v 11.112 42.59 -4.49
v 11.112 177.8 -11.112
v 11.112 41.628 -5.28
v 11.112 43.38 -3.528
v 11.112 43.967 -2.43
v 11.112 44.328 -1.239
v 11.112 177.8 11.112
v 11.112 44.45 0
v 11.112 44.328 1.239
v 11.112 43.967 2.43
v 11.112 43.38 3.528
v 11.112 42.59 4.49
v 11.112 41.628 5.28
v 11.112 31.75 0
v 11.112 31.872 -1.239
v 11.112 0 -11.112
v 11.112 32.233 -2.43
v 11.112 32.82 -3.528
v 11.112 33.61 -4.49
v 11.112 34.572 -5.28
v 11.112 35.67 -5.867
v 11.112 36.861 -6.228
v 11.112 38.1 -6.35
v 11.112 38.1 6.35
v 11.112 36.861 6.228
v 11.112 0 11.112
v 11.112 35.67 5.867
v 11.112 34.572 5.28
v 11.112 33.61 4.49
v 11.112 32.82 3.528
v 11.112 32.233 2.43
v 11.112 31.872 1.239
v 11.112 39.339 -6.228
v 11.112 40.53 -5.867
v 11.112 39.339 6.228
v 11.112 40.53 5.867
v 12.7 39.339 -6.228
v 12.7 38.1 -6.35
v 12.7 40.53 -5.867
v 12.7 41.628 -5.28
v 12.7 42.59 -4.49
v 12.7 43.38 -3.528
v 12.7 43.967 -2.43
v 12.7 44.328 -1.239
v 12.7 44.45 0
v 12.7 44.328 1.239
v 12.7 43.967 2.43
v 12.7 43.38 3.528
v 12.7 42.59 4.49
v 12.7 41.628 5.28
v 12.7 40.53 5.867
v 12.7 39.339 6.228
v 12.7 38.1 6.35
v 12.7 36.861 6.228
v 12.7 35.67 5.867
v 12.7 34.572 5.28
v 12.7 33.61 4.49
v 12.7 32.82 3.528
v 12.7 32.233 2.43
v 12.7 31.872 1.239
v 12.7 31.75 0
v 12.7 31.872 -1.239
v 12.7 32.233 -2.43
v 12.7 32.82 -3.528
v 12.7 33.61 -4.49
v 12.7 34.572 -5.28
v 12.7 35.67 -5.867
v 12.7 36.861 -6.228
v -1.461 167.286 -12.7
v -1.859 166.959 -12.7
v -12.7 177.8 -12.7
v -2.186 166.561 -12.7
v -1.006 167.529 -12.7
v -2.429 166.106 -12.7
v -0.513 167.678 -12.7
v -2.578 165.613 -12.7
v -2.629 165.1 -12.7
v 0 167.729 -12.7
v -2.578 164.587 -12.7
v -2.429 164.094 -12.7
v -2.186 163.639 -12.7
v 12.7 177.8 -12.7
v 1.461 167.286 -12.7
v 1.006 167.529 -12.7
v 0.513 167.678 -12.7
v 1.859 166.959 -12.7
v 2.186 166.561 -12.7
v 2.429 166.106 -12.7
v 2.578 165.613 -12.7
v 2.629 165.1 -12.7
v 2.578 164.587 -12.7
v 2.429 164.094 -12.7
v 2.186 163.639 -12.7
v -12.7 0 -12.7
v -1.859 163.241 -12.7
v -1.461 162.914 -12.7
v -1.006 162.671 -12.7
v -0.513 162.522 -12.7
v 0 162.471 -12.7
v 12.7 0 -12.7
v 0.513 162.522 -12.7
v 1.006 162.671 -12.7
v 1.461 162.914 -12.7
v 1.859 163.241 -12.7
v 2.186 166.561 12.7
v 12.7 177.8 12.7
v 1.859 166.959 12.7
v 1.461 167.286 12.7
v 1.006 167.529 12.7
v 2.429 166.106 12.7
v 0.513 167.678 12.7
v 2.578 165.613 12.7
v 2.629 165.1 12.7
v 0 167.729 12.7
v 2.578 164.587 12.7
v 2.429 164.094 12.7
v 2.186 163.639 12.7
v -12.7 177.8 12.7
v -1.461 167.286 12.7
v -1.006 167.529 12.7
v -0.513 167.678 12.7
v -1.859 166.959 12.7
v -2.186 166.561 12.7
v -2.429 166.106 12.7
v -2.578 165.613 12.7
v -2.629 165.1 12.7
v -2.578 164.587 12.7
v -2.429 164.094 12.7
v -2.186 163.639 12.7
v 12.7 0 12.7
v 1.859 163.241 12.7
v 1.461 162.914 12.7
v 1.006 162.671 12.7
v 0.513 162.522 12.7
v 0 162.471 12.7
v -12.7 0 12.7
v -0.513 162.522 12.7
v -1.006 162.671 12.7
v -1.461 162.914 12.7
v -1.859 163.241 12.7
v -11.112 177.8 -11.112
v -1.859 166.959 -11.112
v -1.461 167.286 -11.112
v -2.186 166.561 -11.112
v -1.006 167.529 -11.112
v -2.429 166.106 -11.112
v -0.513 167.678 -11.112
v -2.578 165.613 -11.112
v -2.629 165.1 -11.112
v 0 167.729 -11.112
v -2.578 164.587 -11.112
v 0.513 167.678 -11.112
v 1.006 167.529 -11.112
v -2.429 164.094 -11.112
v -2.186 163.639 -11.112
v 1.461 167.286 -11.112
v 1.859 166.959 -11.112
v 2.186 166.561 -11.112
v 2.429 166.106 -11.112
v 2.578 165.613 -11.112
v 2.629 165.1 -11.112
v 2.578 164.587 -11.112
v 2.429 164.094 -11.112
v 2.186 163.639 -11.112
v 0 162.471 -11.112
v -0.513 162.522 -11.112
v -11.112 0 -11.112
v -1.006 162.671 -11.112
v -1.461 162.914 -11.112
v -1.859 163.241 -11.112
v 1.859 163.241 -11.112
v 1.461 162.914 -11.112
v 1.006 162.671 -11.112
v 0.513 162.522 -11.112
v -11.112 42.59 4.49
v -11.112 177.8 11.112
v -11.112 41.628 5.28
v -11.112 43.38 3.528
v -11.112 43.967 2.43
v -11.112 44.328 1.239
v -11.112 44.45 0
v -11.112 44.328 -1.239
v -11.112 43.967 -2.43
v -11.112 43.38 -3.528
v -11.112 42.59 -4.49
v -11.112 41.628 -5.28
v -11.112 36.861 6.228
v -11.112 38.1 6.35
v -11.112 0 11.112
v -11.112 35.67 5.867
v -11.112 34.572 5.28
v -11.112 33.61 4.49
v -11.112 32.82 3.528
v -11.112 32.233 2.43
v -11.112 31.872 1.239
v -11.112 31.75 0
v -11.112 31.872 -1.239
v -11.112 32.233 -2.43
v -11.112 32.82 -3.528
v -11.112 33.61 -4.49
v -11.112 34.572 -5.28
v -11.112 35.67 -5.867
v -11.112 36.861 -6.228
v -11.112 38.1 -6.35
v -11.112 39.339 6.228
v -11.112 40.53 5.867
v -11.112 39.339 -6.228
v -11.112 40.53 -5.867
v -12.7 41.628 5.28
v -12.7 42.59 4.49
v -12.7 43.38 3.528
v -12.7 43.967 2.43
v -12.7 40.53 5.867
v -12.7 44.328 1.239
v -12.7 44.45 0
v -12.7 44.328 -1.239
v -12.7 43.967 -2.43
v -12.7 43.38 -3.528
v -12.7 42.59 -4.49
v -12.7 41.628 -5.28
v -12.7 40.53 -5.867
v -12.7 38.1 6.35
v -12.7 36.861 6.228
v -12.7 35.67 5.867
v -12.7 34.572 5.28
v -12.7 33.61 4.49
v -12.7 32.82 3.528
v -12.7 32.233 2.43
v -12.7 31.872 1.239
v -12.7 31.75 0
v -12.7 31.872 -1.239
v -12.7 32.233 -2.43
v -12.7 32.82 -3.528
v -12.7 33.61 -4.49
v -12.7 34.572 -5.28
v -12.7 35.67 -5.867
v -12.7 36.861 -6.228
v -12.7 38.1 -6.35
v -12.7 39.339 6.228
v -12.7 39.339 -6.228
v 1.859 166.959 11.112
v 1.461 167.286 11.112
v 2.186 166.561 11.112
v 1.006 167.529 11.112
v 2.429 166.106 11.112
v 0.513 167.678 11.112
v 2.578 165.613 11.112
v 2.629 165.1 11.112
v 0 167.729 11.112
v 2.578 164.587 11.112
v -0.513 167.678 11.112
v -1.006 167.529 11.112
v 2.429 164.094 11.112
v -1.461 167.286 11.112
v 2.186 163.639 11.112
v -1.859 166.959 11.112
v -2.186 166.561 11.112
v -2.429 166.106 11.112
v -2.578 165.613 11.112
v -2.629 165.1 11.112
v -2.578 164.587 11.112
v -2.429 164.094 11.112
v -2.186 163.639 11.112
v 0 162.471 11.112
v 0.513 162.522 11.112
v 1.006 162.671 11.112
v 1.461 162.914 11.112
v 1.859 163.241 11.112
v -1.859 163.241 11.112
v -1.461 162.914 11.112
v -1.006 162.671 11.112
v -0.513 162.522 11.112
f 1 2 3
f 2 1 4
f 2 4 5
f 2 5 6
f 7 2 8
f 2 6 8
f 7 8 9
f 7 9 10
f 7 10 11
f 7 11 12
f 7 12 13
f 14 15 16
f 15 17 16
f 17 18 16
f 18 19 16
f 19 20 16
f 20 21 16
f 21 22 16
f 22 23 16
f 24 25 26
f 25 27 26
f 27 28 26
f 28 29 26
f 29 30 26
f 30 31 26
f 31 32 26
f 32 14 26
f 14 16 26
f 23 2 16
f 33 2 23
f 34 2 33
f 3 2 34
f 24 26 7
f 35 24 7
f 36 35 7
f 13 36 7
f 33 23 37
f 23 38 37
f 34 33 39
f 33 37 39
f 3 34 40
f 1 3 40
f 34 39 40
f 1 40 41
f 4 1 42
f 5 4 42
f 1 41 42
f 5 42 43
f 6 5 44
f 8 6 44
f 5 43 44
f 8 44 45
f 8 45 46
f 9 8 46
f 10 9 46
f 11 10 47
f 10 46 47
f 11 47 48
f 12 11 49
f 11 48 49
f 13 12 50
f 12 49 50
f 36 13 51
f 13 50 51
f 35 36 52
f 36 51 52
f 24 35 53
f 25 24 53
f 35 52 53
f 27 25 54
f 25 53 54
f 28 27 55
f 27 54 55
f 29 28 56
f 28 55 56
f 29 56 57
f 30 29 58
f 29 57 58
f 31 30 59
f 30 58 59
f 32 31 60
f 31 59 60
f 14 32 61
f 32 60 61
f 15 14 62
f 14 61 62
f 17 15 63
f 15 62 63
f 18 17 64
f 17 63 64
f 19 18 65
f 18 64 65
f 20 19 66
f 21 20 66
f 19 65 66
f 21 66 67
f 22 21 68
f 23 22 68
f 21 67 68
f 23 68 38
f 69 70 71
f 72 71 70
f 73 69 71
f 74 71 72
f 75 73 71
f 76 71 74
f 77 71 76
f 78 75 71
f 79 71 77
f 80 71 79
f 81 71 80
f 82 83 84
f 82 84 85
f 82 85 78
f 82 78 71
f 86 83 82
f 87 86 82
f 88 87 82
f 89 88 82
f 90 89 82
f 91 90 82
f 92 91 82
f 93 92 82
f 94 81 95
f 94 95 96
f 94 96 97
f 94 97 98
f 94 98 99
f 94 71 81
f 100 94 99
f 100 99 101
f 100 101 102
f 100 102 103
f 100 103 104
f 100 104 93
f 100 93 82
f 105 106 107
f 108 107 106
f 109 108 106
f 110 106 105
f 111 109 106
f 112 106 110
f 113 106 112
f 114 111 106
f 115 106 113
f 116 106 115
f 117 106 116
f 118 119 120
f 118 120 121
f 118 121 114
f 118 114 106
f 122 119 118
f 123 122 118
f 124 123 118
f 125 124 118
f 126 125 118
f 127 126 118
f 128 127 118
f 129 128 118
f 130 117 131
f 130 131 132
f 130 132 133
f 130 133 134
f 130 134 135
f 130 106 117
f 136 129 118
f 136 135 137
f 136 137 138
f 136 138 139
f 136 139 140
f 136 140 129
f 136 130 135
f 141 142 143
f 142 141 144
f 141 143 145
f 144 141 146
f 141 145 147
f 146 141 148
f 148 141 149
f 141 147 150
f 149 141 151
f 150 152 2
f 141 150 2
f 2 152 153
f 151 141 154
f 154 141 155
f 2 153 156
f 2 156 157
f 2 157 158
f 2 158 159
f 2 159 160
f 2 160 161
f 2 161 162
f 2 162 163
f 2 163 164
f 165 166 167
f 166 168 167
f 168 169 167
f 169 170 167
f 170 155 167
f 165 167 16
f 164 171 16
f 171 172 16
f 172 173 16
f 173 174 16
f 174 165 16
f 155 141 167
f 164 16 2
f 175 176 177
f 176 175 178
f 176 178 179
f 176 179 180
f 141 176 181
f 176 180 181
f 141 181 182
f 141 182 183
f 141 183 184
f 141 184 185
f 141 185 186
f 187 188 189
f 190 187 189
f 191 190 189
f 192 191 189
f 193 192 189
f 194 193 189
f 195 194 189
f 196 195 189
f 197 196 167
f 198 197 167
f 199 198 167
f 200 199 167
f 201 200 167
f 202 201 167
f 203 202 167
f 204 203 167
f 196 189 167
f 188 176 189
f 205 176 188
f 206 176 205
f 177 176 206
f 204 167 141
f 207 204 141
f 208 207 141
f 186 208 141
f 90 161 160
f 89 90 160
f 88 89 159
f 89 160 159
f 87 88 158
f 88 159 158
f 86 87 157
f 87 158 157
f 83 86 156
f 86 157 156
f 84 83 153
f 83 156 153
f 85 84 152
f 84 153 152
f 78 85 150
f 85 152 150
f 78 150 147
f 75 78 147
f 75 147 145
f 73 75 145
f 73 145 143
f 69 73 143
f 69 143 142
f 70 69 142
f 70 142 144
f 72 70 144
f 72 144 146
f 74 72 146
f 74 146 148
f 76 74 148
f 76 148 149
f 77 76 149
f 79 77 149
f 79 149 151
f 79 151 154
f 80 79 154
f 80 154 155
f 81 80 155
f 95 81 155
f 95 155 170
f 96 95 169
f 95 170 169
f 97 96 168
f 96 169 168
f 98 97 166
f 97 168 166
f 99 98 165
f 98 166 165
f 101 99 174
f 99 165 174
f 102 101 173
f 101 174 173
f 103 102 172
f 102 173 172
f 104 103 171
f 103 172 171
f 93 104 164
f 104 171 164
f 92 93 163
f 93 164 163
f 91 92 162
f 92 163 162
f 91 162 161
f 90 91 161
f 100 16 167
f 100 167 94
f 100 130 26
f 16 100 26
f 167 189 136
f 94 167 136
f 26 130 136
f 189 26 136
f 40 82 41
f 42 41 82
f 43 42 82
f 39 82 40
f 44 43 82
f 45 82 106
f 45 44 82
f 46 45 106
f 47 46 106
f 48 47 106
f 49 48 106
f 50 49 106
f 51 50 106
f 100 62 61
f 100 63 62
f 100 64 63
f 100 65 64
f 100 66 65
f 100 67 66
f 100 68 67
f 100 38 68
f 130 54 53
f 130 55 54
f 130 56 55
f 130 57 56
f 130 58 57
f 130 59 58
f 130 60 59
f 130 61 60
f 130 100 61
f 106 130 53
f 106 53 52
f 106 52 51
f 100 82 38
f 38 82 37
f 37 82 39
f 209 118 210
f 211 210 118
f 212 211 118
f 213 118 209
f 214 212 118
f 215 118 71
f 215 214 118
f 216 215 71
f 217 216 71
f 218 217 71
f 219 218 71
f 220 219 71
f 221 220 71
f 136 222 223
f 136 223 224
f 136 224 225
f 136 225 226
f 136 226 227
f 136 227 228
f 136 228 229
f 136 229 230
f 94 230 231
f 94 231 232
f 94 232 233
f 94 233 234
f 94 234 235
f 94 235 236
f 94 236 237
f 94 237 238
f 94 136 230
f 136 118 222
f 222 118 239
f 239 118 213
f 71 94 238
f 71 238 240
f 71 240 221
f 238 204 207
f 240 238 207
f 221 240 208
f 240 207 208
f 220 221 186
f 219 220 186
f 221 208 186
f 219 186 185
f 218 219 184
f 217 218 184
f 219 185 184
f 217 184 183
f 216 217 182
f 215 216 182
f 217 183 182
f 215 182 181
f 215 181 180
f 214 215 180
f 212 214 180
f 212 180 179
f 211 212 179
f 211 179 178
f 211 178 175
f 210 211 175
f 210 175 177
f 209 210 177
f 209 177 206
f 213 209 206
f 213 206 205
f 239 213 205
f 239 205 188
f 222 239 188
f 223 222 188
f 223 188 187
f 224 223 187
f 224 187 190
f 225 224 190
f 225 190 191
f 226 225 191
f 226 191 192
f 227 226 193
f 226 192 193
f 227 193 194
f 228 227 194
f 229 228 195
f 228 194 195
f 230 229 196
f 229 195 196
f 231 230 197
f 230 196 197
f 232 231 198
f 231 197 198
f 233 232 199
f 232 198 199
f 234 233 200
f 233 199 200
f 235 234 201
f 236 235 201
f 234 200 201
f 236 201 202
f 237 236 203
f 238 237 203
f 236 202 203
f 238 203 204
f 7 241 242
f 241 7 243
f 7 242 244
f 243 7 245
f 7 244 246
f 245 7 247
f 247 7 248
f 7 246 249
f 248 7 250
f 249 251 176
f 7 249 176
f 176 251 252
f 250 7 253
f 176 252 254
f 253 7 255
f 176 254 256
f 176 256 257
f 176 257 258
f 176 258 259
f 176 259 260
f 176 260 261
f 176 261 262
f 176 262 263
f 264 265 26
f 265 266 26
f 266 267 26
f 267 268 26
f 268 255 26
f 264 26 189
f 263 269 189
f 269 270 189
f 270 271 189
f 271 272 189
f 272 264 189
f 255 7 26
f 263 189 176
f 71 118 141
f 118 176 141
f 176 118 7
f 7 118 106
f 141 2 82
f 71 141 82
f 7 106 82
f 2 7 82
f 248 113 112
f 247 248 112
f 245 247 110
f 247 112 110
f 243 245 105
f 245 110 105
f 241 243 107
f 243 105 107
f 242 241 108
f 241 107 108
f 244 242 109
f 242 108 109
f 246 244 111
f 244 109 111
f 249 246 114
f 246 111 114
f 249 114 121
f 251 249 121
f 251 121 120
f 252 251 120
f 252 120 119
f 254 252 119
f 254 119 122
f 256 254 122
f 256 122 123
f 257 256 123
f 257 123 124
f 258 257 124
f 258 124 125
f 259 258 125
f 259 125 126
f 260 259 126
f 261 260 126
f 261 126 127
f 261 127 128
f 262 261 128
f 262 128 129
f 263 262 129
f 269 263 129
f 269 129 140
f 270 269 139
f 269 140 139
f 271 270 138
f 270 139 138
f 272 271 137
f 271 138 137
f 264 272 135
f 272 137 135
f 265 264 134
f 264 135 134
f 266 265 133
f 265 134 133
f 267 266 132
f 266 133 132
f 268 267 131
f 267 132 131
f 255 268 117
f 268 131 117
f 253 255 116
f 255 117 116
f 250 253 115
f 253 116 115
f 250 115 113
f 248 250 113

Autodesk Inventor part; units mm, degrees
ref_plane "YZ Plane" through (0, 0, 0) normal (1, 0, 0) x (0, 1, 0)
ref_plane "XZ Plane" through (0, 0, 0) normal (0, 1, 0) x (-1, 0, 0)
ref_plane "XY Plane" through (0, 0, 0) normal (0, 0, 1) x (1, 0, 0)
sketch "Sketch1" plane through (0, 0, 0) normal (0, 1, 0) x (-1, 0, 0)
  line L0 (12.7, 12.7) -> (12.7, -12.7)
  line L1 (12.7, -12.7) -> (-12.7, -12.7)
  line L2 (-12.7, -12.7) -> (-12.7, 12.7)
  line L3 (-12.7, 12.7) -> (12.7, 12.7)
  line L4 (12.7, 12.7) -> (-12.7, -12.7) construction
  line L5 (12.7, -12.7) -> (-12.7, 12.7) construction
  line L6 (11.1125, 11.1125) -> (11.1125, -11.1125)
  line L7 (11.1125, -11.1125) -> (-11.1125, -11.1125)
  line L8 (-11.1125, -11.1125) -> (-11.1125, 11.1125)
  line L9 (-11.1125, 11.1125) -> (11.1125, 11.1125)
  line L10 (11.1125, 11.1125) -> (-11.1125, -11.1125) construction
  line L11 (11.1125, -11.1125) -> (-11.1125, 11.1125) construction
  point P0 (0, 0)
  dimension "d0" = 25.4
  dimension "d1" = 25.4
  dimension "d2" = 1.5875
  dimension "d3" = 1.5875
extrude "Extrusion1" add sketch "Sketch1" along normal blind 660.4
sketch "Sketch2" plane through (12.7, 0, 12.7) normal (1, 0, 0) x (0, 0, -1)
  line L0 (12.7, 0) -> (12.7, 38.1)
  circle A0 centre (12.7, 38.1) radius 4.7625
  line L1 (3.9688, 38.1) -> (8.3344, 45.6615)
  line L2 (8.3344, 45.6615) -> (17.0656, 45.6615)
  line L3 (17.0656, 45.6615) -> (21.4313, 38.1)
  line L4 (21.4313, 38.1) -> (17.0656, 30.5385)
  line L5 (17.0656, 30.5385) -> (8.3344, 30.5385)
  line L6 (8.3344, 30.5385) -> (3.9688, 38.1)
  dimension "d6" = 38.1
  dimension "d7" = 9.525
  dimension "d8" = 8.7312
extrude "Extrusion2" cut sketch "Sketch2" against normal blind 46.6 contours A0
sketch "Sketch3" plane through (12.7, 0, 12.7) normal (1, 0, 0) x (0, 0, -1)
  line L0 (12.7, 0) -> (12.7, 177.8)
  line L1 (0, 0) -> (0, 660.4) projected
  line L2 (0, 177.8) -> (180.4268, 177.8)
  line L3 (180.4268, 177.8) -> (180.4268, 742.2297)
  line L4 (180.4268, 742.2297) -> (0, 742.2297)
  line L5 (0, 742.2297) -> (0, 177.8)
  dimension "d11" = 177.8
extrude "Extrusion3" cut sketch "Sketch3" against normal blind 354.85
sketch "Sketch4" plane through (12.7, 0, 12.7) normal (1, 0, 0) x (0, 0, -1)
  point P0 (12.7, 0)
sketch "Sketch5" plane through (-12.7, 0, 12.7) normal (0, 0, 1) x (1, 0, 0)
  line L0 (0, 177.8) -> (25.4, 177.8) projected
  line L1 (12.7, 177.8) -> (12.7, 165.1)
  circle A0 centre (12.7, 165.1) radius 2.6289
  point P0 (12.7, 0)
  dimension "d14" = 12.7
  dimension "d15" = 5.2578
extrude "Extrusion4" cut sketch "Sketch5" against normal blind 86.1
sketch "Sketch6" plane through (12.7, 0, 12.7) normal (1, 0, 0) x (0, 0, -1)
  circle A0 centre (12.7, 38.1) radius 4.7625 projected
  circle A1 centre (12.7, 38.1) radius 6.35
  point P0 (12.7, 0)
  dimension "d18" = 12.7
extrude "Extrusion5" cut sketch "Sketch6" against normal blind 44.35
properties part number "Tube Finger" material "Aluminum 6061"
